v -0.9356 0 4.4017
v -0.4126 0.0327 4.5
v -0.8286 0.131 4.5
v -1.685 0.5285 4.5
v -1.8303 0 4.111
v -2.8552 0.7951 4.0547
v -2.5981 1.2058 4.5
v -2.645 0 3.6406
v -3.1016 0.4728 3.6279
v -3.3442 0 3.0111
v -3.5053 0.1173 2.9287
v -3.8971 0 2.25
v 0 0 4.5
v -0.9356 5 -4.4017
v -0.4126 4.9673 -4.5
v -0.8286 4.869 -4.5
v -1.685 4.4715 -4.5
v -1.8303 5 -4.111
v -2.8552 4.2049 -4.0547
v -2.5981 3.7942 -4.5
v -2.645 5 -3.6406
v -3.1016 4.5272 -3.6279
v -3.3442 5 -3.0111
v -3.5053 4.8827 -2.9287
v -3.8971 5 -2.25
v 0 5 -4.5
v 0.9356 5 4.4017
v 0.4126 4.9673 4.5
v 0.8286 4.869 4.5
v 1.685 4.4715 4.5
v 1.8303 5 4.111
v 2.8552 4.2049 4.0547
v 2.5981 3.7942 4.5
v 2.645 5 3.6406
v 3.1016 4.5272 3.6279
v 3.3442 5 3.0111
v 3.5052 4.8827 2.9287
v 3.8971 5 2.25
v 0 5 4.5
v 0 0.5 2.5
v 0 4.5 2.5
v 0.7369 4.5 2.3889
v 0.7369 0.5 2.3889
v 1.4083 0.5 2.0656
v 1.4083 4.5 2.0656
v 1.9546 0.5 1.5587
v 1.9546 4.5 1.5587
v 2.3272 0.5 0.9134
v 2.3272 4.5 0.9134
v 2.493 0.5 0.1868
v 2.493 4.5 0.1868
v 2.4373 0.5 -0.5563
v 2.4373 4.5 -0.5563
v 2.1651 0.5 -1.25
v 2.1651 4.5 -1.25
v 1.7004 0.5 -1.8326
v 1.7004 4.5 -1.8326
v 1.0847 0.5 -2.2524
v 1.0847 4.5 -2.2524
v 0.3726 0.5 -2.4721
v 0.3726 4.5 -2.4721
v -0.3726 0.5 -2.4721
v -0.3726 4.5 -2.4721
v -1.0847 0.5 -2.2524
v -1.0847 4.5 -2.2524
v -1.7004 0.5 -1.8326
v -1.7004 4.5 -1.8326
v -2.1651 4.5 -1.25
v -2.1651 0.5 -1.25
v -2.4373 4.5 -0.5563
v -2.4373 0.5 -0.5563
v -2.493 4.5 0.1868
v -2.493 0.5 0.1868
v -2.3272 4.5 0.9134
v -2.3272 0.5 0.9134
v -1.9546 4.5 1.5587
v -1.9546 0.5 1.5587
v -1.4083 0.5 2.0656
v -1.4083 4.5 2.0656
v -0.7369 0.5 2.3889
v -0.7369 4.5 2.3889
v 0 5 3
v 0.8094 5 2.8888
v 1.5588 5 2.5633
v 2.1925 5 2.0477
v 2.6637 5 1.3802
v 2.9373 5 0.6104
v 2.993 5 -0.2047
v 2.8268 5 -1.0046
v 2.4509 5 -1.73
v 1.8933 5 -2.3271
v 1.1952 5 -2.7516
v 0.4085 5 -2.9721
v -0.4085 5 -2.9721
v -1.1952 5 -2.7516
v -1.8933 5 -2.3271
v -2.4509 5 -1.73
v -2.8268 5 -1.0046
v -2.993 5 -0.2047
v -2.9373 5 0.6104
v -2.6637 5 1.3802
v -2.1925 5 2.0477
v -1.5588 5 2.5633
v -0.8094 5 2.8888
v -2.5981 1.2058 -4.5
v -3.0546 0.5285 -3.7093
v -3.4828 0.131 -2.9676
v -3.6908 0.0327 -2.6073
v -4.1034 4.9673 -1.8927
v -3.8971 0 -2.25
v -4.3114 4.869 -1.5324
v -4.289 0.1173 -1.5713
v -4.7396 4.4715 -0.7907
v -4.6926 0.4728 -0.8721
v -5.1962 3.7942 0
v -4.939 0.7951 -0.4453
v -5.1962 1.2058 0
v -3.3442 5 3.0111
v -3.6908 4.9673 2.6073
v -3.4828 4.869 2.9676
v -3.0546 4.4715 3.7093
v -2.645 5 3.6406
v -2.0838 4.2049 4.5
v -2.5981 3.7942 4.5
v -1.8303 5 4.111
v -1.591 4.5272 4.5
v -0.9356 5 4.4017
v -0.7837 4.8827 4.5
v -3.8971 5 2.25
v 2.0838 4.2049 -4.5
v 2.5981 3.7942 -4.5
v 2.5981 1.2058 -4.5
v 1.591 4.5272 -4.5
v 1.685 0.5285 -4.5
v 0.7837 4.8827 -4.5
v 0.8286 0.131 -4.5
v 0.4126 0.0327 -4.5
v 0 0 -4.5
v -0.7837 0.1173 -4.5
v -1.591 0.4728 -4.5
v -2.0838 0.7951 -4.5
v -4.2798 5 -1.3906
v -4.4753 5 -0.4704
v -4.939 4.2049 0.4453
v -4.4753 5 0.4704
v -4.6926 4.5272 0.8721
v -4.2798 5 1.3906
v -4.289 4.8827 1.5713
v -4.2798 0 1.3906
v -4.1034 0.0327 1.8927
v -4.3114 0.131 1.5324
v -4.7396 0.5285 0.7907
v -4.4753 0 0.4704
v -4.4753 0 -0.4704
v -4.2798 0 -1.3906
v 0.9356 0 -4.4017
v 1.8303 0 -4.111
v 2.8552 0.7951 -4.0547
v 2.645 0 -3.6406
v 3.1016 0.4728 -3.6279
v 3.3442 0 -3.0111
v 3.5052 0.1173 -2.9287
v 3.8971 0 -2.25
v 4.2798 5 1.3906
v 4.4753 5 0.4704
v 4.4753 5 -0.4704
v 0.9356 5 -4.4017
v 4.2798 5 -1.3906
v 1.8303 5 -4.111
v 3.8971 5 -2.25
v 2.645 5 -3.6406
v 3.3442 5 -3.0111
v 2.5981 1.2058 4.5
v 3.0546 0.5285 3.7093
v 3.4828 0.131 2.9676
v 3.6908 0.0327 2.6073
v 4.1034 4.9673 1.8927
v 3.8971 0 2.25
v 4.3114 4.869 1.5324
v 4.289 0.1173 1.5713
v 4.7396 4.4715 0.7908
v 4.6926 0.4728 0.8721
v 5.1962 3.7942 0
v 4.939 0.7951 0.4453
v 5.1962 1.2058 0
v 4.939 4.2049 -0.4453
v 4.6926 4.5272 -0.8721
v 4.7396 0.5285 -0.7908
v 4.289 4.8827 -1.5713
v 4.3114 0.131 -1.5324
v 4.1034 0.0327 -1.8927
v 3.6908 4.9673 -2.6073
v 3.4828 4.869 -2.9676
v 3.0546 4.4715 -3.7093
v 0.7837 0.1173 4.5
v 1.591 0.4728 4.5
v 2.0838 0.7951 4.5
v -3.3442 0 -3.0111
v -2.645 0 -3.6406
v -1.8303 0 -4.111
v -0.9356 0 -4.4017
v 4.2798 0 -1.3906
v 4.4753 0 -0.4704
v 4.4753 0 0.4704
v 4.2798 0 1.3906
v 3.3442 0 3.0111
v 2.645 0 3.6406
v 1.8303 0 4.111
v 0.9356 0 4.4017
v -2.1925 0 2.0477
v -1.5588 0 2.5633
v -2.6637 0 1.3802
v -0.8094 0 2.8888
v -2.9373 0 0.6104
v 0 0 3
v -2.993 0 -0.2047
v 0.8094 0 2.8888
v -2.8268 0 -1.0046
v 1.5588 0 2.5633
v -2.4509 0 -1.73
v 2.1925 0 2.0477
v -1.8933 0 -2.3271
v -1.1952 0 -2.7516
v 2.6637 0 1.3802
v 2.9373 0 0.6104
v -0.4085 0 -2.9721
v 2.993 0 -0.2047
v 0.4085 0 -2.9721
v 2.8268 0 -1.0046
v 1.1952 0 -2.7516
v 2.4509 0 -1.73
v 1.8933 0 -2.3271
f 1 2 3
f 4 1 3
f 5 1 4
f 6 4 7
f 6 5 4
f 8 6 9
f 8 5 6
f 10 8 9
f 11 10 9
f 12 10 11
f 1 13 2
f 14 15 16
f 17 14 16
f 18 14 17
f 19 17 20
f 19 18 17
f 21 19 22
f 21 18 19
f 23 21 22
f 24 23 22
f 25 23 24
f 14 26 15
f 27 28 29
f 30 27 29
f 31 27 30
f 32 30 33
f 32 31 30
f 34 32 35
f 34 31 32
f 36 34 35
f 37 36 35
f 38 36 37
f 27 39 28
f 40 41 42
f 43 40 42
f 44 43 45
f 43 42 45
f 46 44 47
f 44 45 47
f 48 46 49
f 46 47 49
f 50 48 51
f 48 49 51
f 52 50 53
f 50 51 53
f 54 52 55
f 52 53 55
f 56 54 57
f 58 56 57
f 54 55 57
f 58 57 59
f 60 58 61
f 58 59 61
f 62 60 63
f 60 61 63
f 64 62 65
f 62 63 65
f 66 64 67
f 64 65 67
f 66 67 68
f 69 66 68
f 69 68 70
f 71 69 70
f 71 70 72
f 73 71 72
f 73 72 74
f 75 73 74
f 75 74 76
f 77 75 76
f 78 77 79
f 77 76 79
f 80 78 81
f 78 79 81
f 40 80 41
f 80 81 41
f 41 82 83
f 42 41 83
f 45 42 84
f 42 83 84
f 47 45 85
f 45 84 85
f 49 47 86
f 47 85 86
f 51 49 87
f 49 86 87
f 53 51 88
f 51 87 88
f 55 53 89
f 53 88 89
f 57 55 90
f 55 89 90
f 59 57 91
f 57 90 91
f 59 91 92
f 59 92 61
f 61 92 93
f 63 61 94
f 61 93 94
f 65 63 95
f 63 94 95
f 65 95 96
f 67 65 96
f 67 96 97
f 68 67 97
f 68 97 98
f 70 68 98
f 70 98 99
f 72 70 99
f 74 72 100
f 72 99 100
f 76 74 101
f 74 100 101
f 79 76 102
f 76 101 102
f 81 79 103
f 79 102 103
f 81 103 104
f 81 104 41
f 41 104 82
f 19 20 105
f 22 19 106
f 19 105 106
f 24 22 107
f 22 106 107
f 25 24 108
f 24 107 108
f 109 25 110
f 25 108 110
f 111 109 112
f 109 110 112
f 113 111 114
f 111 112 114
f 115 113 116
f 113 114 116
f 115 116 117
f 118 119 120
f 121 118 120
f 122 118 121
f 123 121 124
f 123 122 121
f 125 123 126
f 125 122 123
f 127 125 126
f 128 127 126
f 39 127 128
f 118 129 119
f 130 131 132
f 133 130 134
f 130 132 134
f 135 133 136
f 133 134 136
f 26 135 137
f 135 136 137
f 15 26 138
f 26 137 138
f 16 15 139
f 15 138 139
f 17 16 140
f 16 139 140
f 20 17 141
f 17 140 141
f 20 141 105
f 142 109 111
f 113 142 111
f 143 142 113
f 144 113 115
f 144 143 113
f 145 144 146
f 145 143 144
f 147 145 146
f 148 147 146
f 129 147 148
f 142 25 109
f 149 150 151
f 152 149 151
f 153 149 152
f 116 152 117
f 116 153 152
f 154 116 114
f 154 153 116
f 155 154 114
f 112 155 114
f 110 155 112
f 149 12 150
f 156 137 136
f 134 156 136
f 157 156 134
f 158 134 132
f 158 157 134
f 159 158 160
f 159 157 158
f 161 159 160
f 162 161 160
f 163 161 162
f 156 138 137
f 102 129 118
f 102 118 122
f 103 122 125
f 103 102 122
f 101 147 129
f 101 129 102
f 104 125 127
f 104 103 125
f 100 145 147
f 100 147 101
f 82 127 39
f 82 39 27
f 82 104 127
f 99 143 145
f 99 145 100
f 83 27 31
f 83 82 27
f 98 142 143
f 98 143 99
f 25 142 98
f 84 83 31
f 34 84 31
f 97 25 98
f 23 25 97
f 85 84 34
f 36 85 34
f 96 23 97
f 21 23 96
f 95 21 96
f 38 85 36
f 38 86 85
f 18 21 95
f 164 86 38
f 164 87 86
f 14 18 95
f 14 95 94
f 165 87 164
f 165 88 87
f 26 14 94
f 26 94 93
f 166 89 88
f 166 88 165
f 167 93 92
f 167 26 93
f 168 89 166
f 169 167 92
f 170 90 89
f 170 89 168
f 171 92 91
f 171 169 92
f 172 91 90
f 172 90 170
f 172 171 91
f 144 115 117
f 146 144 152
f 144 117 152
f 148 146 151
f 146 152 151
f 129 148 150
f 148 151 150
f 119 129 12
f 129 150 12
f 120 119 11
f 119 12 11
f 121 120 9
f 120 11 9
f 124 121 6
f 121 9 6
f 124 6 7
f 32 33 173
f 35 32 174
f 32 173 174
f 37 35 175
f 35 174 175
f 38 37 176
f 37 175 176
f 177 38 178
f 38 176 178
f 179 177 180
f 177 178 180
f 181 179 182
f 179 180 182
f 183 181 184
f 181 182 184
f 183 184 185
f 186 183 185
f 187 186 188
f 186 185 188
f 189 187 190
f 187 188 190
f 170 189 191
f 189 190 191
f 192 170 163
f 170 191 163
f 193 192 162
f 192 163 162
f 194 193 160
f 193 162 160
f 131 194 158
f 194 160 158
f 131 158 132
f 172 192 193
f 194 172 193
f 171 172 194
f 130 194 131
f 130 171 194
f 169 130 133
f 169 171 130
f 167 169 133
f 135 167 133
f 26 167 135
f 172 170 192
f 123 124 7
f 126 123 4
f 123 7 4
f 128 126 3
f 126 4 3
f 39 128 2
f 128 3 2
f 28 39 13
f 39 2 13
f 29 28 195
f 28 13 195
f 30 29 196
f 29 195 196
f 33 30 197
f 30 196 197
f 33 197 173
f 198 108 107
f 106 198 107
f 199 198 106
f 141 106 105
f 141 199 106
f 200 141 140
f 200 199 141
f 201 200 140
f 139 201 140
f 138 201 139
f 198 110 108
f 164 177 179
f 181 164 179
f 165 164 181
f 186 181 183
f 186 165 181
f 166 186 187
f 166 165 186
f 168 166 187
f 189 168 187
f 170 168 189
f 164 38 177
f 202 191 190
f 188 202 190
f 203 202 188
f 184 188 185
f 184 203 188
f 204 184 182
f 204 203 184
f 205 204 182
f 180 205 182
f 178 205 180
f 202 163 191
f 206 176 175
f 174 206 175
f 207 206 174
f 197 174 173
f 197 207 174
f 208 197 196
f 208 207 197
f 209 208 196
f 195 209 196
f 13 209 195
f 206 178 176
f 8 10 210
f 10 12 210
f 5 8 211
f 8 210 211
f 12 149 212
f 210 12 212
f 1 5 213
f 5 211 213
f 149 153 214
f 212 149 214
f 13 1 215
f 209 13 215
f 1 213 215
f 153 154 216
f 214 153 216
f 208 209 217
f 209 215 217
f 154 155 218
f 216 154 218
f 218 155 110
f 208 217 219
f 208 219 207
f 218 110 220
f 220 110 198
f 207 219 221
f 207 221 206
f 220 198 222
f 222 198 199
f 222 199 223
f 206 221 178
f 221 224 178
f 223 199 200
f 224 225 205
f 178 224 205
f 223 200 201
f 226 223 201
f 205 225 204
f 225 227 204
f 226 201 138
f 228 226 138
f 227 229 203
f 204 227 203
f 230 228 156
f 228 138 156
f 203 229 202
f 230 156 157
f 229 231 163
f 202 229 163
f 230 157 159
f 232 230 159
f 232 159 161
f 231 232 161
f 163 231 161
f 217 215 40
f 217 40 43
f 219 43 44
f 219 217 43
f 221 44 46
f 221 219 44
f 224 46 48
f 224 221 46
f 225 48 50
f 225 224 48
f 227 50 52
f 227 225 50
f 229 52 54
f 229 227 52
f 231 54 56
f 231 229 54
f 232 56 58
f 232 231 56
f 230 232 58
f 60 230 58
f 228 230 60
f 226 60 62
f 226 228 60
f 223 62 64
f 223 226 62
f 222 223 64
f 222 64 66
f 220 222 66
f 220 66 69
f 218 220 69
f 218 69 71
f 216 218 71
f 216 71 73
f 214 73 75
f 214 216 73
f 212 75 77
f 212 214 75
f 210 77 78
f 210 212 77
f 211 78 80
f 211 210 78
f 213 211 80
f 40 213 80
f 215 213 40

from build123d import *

# Parameters (mm, degrees)
EXTRUDE_1_DEPTH     = 5
SKETCH_2_R          = 2.5
CUT_EXTRUDE_1_DEPTH = 5
SKETCH_3_OUTSIDE_W  = 21.092
SKETCH_3_OUTSIDE_H  = 19.7
SKETCH_3_OUTSIDE_R  = 4.5
CUT_EXTRUDE_2_DEPTH = 5
CUT_EXTRUDE_2_DRAFT = -30
SKETCH_4_OUTSIDE_W  = 21.092
SKETCH_4_OUTSIDE_H  = 19.7
SKETCH_4_OUTSIDE_R  = 4.5
CUT_EXTRUDE_3_DEPTH = 5
CUT_EXTRUDE_3_DRAFT = -30
CHAMFER_1_SIZE      = 0.5
CHAMFER_2_SIZE      = 0.5


with BuildPart() as part:
    # 草图1 → 凸台-拉伸1 (new body)
    with BuildSketch(Plane(origin=(0, 0, 0), x_dir=(1, 0, 0), z_dir=(0, 1, 0))):
        Polygon((2.598076211, 4.5), (-2.598076211, 4.5), (-5.196152423, 0), (-2.598076211, -4.5), (2.598076211, -4.5), (5.196152423, 0), align=None)
    extrude(amount=EXTRUDE_1_DEPTH)

    # 草图2 → 切除-拉伸1 (cut)
    with BuildSketch(Plane(origin=(0, 5, 0), x_dir=(1, 0, 0), z_dir=(0, 1, 0))):
        with Locations(Location((0, 0, 0), (0, 0, 270))):
            Circle(SKETCH_2_R)
    extrude(amount=-CUT_EXTRUDE_1_DEPTH, mode=Mode.SUBTRACT)


with BuildPart() as cut_extrude_2_tool:
    # 草图3 outside → 切除-拉伸2 (with draft: the straight prism first)
    with BuildSketch(Plane(origin=(0, 5, 0), x_dir=(1, 0, 0), z_dir=(0, 1, 0))):
        Rectangle(SKETCH_3_OUTSIDE_W, SKETCH_3_OUTSIDE_H)
        Circle(SKETCH_3_OUTSIDE_R, mode=Mode.SUBTRACT)
    extrude(amount=-CUT_EXTRUDE_2_DEPTH)
    # 切除-拉伸2: the draft: its side faces are tilted about the plane it starts from
    cut_extrude_2_sides = [cut_extrude_2_tool.faces().sort_by_distance(p)[0] for p in [
        (0, 2.5, 9.85),
        (10.546, 2.5, 0),
        (0, 2.5, -9.85),
        (-10.546, 2.5, 0),
        (-4.5, 2.5, 0),
    ]]
    draft(cut_extrude_2_sides, Plane(origin=(0, 5, 0), x_dir=(1, 0, 0), z_dir=(0, 1, 0)), CUT_EXTRUDE_2_DRAFT)


with BuildPart() as part_1:
    add(part.part)

    # 切除-拉伸2: cut by cut_extrude_2_tool
    add(cut_extrude_2_tool.part, mode=Mode.SUBTRACT)


with BuildPart() as cut_extrude_3_tool:
    # 草图4 outside → 切除-拉伸3 (with draft: the straight prism first)
    with BuildSketch(Plane.XZ):
        Rectangle(SKETCH_4_OUTSIDE_W, SKETCH_4_OUTSIDE_H)
        Circle(SKETCH_4_OUTSIDE_R, mode=Mode.SUBTRACT)
    extrude(amount=-CUT_EXTRUDE_3_DEPTH)
    # 切除-拉伸3: the draft: its side faces are tilted about the plane it starts from
    cut_extrude_3_sides = [cut_extrude_3_tool.faces().sort_by_distance(p)[0] for p in [
        (0, 2.5, -9.85),
        (10.546, 2.5, 0),
        (0, 2.5, 9.85),
        (-10.546, 2.5, 0),
        (-4.5, 2.5, 0),
    ]]
    draft(cut_extrude_3_sides, Plane.XZ, CUT_EXTRUDE_3_DRAFT)


with BuildPart() as part_2:
    add(part_1.part)

    # 切除-拉伸3: cut by cut_extrude_3_tool
    add(cut_extrude_3_tool.part, mode=Mode.SUBTRACT)

    # 倒角1
    chamfer_1_edges = [part_2.edges().sort_by_distance(p)[0] for p in [
        (0, 5, -2.5),
    ]]
    chamfer(chamfer_1_edges, length=CHAMFER_1_SIZE)

    # 倒角2
    chamfer_2_edges = [part_2.edges().sort_by_distance(p)[0] for p in [
        (0, 0, -2.5),
    ]]
    chamfer(chamfer_2_edges, length=CHAMFER_2_SIZE)


solid = part_2.part
